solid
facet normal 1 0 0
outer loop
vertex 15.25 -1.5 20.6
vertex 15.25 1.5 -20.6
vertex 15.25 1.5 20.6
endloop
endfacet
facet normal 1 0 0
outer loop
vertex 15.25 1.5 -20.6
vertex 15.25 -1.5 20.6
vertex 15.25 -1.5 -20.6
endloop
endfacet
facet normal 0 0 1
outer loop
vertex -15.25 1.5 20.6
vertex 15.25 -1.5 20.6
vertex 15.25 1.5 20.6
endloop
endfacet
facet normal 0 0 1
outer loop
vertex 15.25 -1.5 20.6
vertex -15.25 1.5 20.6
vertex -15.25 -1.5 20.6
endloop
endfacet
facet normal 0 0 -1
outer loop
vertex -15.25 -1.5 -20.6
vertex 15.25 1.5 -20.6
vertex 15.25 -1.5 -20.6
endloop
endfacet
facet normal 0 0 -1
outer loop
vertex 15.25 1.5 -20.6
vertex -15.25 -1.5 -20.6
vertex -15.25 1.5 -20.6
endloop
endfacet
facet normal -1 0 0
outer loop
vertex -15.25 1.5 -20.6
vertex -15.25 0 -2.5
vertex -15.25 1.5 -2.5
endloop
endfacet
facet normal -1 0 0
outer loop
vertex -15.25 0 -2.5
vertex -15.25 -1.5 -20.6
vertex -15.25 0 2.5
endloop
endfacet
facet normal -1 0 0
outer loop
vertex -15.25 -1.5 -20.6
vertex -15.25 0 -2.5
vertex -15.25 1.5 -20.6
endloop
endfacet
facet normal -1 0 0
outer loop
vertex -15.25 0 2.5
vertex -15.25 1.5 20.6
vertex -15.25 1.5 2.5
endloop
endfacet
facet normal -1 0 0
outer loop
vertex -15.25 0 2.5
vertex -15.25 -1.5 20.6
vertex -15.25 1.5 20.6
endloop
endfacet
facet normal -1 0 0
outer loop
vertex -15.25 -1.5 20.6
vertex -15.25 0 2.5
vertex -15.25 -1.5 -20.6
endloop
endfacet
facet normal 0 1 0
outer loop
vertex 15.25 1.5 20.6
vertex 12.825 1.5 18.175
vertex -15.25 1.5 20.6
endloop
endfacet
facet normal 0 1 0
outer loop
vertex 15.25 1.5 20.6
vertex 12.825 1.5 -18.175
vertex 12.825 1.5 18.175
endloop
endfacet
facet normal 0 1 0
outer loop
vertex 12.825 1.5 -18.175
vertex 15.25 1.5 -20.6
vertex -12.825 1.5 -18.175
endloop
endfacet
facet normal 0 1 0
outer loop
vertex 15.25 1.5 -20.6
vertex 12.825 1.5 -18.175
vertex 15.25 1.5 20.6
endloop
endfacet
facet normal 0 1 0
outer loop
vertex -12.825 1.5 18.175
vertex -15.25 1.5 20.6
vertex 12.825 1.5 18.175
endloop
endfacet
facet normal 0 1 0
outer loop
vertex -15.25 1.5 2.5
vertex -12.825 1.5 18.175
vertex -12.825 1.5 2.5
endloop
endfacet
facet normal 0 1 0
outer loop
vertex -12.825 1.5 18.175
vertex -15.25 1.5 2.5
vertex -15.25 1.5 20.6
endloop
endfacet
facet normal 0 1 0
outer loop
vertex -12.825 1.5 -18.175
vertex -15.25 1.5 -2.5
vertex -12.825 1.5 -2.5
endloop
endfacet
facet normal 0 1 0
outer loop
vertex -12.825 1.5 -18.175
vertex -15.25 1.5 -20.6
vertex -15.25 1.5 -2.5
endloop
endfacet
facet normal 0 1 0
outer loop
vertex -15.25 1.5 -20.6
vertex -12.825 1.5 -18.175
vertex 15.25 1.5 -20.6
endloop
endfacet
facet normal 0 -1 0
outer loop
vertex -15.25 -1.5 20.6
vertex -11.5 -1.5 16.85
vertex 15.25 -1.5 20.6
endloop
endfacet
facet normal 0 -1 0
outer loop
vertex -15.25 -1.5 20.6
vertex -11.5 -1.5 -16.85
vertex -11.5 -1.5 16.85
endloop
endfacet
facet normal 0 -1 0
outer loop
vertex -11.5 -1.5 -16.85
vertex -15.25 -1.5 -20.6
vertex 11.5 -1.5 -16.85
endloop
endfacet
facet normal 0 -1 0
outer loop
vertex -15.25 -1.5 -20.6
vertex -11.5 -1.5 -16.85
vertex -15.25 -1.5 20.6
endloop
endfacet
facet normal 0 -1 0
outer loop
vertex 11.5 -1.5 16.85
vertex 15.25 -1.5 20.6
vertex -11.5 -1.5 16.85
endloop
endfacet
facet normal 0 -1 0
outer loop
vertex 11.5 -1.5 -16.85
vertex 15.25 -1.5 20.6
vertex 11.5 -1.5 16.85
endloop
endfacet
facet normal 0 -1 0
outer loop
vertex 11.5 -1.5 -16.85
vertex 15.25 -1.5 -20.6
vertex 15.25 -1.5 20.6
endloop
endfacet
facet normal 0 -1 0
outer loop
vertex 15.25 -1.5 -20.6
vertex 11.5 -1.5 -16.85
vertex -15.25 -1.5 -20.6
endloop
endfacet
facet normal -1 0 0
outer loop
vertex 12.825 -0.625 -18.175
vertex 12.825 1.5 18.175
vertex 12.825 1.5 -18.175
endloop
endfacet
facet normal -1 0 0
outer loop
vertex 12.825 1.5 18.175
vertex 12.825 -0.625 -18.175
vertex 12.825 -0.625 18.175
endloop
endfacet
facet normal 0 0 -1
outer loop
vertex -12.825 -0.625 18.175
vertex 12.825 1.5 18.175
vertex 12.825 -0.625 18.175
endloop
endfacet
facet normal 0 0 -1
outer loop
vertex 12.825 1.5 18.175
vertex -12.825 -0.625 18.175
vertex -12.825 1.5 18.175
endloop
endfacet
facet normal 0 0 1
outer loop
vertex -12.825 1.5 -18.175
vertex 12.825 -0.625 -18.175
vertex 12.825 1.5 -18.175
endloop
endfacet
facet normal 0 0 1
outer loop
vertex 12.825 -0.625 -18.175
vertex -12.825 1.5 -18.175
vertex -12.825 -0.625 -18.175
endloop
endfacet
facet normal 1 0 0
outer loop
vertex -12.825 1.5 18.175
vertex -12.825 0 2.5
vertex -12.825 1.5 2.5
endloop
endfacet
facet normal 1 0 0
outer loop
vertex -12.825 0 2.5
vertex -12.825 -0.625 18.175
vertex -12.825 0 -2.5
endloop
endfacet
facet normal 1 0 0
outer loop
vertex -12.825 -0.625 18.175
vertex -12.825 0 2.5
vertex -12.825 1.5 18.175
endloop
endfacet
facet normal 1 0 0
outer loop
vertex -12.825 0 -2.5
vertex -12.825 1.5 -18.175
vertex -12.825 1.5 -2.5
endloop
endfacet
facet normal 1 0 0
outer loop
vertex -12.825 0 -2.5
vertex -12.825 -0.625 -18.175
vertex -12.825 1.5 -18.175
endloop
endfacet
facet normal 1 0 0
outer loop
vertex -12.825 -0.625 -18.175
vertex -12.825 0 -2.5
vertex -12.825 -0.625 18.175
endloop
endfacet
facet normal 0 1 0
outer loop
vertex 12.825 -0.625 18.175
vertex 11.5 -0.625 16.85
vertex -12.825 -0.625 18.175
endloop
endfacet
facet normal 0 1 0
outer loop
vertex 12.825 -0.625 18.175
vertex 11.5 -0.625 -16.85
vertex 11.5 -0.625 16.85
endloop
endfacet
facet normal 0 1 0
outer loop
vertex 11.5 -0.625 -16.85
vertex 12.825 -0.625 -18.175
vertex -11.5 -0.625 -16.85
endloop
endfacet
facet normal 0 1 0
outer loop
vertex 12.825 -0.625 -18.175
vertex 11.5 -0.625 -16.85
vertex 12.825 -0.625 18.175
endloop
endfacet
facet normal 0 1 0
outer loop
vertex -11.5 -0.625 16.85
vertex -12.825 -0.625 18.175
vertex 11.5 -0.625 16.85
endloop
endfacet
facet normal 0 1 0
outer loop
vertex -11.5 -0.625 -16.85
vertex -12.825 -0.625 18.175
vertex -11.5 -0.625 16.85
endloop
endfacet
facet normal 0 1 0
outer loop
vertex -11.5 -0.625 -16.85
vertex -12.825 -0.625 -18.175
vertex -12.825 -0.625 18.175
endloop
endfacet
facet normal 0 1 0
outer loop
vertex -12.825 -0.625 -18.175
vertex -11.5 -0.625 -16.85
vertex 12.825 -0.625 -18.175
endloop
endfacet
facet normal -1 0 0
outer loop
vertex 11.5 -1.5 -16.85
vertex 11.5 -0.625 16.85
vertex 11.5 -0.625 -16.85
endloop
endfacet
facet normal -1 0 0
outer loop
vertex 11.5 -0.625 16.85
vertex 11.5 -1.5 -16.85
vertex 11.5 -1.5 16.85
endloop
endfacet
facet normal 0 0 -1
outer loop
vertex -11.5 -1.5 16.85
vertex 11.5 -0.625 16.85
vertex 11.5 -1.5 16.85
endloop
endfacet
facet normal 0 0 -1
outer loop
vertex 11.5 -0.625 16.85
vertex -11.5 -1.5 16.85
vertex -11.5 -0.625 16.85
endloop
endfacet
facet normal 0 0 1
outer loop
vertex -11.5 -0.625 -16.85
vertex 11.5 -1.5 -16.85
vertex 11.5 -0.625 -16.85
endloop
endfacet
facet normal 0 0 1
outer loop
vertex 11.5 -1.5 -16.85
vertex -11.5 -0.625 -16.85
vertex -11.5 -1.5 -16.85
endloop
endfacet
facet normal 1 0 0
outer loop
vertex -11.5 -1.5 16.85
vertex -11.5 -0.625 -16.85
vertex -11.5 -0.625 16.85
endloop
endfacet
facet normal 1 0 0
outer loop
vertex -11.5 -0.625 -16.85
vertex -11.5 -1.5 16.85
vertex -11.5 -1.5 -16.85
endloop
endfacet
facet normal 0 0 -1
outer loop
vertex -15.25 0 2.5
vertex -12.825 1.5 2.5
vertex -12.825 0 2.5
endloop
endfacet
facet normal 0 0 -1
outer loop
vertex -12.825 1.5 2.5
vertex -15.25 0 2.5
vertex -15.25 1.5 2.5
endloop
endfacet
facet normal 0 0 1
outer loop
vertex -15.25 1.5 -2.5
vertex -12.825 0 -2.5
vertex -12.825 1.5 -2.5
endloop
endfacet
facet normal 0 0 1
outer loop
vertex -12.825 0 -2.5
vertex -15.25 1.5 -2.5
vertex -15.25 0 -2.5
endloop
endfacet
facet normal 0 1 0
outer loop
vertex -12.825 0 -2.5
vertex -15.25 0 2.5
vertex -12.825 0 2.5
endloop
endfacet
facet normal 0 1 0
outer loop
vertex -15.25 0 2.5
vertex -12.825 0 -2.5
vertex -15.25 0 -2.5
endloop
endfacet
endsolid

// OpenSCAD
//*************************************//
//
//
//
//
//all units in mm.
//CC BY 4.0
//AM Chagas 20180516
//*************************************//

//variables
holed=6;
tol=0.15;
dist2hol = 42.42;//47.15-holed/2;
basethick=20;

dichx=25.5;
dichy=1;
dichz=36.2;
framey=3;

module mount_poles(){
//pole1
translate([dist2hol/2,0,0]){
cylinder(d=holed-tol,h=basethick,center=true,$fn=360);
}//translate
//pole2
translate([-dist2hol/2,0,0]){
cylinder(d=holed-tol,h=basethick,center=true,$fn=360);
}//translate
}//module

module main_holder(){
//dichr place

difference(){
cube([dist2hol+holed-tol,holed-tol+5,40],center=true);

translate([0,0,8]){
    cube([dichz+1,holed-tol+5,40],center=true);

 }//translate
translate([0,0,1.1]){
    rotate([0,90,0]){
        dich_frame1(dx=dichx+5+2*tol,dy=dichy+2+2*tol,dz=dichz+5+2*tol);
    }//rotate
}//translate
translate([0,0,8]){
    rotate([0,90,0]){
        dich_frame1(dx=dichx+5+2*tol,dy=dichy+2+2*tol,dz=dichz+5+2*tol);
    }//rotate
}//translate
}//difference
translate([0,0,-22]){
    cube([dist2hol+holed-tol,holed-tol+5,5],center=true);
}//translate
}//module

//translate([0,0,(basethick+15)/2]){
//main_holder();
//}

module dich_frame1(dx=dichx+5,dy=dichy+2,dz=dichz+5){
difference(){    
cube([dx,dy,dz],center=true);
translate([0,0.5,0]){
    cube([dx-5+tol,dy-0.9+tol,dz-5+tol],center=true);
    }//translate

cube([dx-7.5,dy+1,dz-7.5],center=true);


//translate([(dx-5)/2,1,0]){
//cube([10,dy-0,5],center=true);
//}//translate

translate([-(dx-5)/2,1,0]){
cube([10,dy-1,5],center=true);
}//translate

}//difference
}//module



//union(){

//main_holder();
/*translate([0,5,]){
rotate([0,90,0]){
dich_frame1();
}
}
*/
//translate([0,0,-dichz/2-5]){
//mount_poles();

//}
//}

dich_frame1();
